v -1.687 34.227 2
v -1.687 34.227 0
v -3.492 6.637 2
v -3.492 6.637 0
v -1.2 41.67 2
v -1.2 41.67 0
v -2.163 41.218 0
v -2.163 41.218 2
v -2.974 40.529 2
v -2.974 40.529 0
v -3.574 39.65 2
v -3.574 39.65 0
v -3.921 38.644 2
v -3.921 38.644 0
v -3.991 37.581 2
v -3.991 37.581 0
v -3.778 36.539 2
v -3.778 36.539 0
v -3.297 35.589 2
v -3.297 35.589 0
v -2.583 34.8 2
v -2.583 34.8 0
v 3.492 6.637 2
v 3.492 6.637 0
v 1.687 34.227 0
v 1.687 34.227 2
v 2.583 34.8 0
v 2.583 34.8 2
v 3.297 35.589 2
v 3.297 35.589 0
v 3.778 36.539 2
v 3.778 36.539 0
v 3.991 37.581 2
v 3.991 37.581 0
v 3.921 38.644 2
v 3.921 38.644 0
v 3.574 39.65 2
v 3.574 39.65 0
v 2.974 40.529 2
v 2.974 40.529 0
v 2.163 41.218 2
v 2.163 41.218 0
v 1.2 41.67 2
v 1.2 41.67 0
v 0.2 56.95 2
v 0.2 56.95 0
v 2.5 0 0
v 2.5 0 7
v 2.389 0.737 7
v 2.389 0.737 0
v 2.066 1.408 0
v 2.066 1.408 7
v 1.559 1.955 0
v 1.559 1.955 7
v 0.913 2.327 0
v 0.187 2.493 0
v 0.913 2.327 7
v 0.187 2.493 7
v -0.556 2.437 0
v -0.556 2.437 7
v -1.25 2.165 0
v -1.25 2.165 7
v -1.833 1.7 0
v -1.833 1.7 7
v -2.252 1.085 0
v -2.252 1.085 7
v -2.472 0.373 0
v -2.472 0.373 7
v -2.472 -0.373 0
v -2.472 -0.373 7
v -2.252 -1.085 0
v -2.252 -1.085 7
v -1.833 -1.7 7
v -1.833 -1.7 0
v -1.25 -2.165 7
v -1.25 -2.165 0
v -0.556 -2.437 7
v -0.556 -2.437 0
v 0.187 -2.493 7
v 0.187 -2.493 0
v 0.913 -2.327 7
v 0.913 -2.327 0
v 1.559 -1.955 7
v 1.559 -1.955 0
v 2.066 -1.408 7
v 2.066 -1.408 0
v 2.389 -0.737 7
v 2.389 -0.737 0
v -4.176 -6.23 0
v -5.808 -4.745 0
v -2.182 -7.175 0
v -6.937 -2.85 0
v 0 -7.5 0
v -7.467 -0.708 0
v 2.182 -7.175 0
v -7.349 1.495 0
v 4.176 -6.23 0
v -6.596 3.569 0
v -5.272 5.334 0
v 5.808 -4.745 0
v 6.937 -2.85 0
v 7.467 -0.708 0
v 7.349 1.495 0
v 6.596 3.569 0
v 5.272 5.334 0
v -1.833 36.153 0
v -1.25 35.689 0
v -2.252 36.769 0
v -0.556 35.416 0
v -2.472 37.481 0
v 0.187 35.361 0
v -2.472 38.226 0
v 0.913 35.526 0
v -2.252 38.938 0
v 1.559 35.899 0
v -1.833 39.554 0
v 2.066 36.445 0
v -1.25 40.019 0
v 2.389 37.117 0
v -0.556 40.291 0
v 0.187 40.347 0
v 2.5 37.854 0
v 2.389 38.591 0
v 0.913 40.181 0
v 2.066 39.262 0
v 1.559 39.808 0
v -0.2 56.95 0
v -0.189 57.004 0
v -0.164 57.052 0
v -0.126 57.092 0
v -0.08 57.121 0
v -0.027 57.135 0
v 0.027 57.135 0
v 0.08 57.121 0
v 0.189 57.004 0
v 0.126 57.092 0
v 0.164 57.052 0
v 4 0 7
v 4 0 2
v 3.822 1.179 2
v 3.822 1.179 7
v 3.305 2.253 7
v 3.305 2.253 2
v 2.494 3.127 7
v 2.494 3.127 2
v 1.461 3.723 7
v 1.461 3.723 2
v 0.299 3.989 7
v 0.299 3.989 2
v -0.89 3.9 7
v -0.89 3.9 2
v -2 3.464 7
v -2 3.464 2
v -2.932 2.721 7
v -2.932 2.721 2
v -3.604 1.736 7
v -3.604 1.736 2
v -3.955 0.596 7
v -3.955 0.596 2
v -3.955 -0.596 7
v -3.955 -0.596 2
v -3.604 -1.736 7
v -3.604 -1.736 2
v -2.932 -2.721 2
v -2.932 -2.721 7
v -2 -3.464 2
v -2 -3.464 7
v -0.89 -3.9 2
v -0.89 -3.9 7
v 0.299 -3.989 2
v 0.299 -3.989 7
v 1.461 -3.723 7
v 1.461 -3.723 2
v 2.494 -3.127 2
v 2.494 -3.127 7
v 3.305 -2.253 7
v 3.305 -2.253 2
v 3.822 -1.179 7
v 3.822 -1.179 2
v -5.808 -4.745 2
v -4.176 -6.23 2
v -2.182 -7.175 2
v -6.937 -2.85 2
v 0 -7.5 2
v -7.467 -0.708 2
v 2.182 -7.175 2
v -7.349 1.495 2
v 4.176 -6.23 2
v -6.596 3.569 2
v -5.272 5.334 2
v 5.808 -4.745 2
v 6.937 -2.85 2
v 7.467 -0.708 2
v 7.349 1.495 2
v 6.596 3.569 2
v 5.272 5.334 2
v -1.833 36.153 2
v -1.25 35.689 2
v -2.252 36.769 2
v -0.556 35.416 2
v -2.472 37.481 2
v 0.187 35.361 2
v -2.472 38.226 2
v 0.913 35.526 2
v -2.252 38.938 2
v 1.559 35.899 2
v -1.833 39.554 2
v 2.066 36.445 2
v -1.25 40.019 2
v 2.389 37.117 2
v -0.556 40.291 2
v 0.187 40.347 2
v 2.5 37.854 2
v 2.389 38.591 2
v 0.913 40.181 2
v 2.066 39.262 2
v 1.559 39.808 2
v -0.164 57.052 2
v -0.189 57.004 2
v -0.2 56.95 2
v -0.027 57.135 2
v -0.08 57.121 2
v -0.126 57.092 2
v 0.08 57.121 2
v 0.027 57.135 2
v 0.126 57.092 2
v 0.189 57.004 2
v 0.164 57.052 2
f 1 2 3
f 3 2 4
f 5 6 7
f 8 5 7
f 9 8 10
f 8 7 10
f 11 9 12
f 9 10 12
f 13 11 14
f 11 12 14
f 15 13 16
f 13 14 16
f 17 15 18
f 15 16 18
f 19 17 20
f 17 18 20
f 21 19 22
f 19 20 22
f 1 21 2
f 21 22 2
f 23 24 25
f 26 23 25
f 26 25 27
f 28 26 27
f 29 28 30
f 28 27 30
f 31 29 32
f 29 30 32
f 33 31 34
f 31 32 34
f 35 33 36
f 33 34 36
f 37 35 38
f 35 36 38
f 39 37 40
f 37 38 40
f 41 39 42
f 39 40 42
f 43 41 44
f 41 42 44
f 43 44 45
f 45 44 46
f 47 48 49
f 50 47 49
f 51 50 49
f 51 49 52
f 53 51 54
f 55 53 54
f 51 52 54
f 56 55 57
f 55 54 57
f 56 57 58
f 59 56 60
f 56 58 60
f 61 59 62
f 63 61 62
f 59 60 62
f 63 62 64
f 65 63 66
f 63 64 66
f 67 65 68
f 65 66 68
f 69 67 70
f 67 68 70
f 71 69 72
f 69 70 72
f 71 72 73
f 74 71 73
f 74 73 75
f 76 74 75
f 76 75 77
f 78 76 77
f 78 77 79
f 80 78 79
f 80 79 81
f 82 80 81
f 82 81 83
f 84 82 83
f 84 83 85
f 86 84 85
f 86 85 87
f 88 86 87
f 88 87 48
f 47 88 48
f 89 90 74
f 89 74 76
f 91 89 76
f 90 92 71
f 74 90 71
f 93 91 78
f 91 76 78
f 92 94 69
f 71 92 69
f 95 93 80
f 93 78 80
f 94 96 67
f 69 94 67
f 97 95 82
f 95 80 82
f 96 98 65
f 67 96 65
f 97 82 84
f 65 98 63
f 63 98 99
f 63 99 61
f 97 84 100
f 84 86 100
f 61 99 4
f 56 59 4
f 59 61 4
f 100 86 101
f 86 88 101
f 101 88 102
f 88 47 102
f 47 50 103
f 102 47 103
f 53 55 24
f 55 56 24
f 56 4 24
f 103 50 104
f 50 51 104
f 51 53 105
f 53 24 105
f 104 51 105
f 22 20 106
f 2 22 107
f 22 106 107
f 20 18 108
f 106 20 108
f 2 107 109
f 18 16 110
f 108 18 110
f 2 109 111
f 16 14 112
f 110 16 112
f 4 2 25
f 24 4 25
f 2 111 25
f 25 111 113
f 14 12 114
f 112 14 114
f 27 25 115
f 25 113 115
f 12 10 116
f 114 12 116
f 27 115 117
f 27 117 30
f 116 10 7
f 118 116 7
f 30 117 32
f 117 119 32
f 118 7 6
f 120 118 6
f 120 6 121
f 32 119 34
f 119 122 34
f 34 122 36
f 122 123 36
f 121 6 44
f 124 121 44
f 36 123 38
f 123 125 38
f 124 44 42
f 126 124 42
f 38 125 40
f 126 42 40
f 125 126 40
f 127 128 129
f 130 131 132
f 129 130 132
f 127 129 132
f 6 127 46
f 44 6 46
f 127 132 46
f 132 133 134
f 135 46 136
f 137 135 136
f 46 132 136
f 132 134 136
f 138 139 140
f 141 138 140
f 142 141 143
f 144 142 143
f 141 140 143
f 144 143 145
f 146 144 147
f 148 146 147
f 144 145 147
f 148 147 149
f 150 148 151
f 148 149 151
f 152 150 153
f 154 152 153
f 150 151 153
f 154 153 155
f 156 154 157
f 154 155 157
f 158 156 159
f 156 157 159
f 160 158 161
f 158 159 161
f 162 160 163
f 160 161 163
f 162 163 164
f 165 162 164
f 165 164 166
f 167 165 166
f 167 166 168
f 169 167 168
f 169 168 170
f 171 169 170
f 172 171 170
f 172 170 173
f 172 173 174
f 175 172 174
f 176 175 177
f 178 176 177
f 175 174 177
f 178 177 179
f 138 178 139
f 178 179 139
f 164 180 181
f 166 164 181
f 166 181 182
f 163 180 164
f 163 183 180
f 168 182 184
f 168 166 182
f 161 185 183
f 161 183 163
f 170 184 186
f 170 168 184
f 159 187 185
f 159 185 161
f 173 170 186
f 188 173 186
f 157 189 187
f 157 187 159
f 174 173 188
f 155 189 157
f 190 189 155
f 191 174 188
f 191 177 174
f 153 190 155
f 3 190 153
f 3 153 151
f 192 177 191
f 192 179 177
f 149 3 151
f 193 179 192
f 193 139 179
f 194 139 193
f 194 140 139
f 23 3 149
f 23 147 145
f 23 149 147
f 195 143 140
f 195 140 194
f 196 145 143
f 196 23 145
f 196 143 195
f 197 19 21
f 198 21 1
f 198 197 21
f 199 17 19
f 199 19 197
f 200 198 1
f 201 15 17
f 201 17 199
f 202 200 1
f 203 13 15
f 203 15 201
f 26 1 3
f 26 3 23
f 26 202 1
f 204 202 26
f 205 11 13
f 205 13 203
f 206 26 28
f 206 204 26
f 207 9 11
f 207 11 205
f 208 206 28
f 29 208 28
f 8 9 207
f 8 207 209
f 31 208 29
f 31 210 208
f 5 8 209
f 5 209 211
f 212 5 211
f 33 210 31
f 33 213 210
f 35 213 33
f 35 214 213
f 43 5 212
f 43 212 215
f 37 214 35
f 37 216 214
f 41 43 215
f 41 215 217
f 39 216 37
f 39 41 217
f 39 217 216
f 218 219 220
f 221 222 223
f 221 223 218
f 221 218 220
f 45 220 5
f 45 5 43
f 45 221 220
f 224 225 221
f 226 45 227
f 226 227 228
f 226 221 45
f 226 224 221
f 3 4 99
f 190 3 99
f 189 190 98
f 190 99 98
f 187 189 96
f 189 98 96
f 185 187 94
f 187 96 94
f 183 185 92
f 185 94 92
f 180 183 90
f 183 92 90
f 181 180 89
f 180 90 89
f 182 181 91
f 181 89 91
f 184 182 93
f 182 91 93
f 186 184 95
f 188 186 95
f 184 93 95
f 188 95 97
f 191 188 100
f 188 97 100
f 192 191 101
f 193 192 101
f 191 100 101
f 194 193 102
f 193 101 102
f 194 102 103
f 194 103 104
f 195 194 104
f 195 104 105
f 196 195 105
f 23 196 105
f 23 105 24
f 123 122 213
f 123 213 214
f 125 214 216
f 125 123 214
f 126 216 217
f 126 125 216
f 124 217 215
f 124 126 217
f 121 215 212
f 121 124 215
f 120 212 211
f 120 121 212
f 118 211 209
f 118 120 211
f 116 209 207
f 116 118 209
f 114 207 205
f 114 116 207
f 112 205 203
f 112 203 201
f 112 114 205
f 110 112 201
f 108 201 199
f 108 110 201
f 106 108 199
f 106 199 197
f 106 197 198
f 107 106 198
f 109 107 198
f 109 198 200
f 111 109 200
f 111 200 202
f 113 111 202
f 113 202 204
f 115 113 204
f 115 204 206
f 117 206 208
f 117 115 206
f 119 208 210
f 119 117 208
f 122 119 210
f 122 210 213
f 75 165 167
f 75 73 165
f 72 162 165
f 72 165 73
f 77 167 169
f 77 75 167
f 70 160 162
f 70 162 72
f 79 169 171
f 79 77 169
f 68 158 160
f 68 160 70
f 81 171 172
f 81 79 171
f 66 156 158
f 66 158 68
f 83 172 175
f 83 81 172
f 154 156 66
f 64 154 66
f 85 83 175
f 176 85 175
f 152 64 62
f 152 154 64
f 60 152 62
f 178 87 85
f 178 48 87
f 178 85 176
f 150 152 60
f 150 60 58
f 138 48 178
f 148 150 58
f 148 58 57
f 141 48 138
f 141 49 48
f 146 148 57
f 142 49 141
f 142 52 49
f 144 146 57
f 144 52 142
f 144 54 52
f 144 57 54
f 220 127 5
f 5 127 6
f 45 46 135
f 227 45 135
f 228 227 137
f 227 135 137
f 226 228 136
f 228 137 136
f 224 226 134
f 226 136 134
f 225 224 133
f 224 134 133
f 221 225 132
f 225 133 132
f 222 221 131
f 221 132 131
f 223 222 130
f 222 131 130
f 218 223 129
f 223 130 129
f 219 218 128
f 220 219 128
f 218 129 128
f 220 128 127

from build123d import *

# Parameters (mm, degrees)
F0_R     = 2.5
F1_DEPTH = 2
F2_R     = 4
F3_DEPTH = 5
F4_R     = 2.5
F5_DEPTH = 7.001


with BuildPart() as f1:
    # F0 (on Top) → F1 (new body)
    with BuildSketch(Plane.XY):
        with BuildLine():
            Line((-1.686594, 34.226591), (-3.492007, 6.637461))
            ThreePointArc((-3.492007, 6.637461), (0, -7.5), (3.492007, 6.637461))
            Line((3.492007, 6.637461), (1.686594, 34.226591))
            ThreePointArc((1.686594, 34.226591), (3.991463, 38.114827), (1.199533, 41.669532))
            Line((1.199533, 41.669532), (0.199573, 56.950255))
            ThreePointArc((0.199573, 56.950255), (0, 57.137195), (-0.199573, 56.950255))
            Line((-0.199573, 56.950255), (-1.199533, 41.669532))
            ThreePointArc((-1.199533, 41.669532), (-3.991463, 38.114827), (-1.686594, 34.226591))
        make_face()
        with Locations((0, 37.853628)):
            Circle(F0_R, mode=Mode.SUBTRACT)
    extrude(amount=F1_DEPTH)

    # F2 (on face) → F3 (join)
    with BuildSketch(Plane.XY.offset(2)):
        Circle(F2_R)
    extrude(amount=F3_DEPTH)

    # F4 (on face) → F5 (cut, through all)
    with BuildSketch(Plane.XY.offset(7)):
        Circle(F4_R)
    extrude(amount=-F5_DEPTH, mode=Mode.SUBTRACT)


solid = f1.part
